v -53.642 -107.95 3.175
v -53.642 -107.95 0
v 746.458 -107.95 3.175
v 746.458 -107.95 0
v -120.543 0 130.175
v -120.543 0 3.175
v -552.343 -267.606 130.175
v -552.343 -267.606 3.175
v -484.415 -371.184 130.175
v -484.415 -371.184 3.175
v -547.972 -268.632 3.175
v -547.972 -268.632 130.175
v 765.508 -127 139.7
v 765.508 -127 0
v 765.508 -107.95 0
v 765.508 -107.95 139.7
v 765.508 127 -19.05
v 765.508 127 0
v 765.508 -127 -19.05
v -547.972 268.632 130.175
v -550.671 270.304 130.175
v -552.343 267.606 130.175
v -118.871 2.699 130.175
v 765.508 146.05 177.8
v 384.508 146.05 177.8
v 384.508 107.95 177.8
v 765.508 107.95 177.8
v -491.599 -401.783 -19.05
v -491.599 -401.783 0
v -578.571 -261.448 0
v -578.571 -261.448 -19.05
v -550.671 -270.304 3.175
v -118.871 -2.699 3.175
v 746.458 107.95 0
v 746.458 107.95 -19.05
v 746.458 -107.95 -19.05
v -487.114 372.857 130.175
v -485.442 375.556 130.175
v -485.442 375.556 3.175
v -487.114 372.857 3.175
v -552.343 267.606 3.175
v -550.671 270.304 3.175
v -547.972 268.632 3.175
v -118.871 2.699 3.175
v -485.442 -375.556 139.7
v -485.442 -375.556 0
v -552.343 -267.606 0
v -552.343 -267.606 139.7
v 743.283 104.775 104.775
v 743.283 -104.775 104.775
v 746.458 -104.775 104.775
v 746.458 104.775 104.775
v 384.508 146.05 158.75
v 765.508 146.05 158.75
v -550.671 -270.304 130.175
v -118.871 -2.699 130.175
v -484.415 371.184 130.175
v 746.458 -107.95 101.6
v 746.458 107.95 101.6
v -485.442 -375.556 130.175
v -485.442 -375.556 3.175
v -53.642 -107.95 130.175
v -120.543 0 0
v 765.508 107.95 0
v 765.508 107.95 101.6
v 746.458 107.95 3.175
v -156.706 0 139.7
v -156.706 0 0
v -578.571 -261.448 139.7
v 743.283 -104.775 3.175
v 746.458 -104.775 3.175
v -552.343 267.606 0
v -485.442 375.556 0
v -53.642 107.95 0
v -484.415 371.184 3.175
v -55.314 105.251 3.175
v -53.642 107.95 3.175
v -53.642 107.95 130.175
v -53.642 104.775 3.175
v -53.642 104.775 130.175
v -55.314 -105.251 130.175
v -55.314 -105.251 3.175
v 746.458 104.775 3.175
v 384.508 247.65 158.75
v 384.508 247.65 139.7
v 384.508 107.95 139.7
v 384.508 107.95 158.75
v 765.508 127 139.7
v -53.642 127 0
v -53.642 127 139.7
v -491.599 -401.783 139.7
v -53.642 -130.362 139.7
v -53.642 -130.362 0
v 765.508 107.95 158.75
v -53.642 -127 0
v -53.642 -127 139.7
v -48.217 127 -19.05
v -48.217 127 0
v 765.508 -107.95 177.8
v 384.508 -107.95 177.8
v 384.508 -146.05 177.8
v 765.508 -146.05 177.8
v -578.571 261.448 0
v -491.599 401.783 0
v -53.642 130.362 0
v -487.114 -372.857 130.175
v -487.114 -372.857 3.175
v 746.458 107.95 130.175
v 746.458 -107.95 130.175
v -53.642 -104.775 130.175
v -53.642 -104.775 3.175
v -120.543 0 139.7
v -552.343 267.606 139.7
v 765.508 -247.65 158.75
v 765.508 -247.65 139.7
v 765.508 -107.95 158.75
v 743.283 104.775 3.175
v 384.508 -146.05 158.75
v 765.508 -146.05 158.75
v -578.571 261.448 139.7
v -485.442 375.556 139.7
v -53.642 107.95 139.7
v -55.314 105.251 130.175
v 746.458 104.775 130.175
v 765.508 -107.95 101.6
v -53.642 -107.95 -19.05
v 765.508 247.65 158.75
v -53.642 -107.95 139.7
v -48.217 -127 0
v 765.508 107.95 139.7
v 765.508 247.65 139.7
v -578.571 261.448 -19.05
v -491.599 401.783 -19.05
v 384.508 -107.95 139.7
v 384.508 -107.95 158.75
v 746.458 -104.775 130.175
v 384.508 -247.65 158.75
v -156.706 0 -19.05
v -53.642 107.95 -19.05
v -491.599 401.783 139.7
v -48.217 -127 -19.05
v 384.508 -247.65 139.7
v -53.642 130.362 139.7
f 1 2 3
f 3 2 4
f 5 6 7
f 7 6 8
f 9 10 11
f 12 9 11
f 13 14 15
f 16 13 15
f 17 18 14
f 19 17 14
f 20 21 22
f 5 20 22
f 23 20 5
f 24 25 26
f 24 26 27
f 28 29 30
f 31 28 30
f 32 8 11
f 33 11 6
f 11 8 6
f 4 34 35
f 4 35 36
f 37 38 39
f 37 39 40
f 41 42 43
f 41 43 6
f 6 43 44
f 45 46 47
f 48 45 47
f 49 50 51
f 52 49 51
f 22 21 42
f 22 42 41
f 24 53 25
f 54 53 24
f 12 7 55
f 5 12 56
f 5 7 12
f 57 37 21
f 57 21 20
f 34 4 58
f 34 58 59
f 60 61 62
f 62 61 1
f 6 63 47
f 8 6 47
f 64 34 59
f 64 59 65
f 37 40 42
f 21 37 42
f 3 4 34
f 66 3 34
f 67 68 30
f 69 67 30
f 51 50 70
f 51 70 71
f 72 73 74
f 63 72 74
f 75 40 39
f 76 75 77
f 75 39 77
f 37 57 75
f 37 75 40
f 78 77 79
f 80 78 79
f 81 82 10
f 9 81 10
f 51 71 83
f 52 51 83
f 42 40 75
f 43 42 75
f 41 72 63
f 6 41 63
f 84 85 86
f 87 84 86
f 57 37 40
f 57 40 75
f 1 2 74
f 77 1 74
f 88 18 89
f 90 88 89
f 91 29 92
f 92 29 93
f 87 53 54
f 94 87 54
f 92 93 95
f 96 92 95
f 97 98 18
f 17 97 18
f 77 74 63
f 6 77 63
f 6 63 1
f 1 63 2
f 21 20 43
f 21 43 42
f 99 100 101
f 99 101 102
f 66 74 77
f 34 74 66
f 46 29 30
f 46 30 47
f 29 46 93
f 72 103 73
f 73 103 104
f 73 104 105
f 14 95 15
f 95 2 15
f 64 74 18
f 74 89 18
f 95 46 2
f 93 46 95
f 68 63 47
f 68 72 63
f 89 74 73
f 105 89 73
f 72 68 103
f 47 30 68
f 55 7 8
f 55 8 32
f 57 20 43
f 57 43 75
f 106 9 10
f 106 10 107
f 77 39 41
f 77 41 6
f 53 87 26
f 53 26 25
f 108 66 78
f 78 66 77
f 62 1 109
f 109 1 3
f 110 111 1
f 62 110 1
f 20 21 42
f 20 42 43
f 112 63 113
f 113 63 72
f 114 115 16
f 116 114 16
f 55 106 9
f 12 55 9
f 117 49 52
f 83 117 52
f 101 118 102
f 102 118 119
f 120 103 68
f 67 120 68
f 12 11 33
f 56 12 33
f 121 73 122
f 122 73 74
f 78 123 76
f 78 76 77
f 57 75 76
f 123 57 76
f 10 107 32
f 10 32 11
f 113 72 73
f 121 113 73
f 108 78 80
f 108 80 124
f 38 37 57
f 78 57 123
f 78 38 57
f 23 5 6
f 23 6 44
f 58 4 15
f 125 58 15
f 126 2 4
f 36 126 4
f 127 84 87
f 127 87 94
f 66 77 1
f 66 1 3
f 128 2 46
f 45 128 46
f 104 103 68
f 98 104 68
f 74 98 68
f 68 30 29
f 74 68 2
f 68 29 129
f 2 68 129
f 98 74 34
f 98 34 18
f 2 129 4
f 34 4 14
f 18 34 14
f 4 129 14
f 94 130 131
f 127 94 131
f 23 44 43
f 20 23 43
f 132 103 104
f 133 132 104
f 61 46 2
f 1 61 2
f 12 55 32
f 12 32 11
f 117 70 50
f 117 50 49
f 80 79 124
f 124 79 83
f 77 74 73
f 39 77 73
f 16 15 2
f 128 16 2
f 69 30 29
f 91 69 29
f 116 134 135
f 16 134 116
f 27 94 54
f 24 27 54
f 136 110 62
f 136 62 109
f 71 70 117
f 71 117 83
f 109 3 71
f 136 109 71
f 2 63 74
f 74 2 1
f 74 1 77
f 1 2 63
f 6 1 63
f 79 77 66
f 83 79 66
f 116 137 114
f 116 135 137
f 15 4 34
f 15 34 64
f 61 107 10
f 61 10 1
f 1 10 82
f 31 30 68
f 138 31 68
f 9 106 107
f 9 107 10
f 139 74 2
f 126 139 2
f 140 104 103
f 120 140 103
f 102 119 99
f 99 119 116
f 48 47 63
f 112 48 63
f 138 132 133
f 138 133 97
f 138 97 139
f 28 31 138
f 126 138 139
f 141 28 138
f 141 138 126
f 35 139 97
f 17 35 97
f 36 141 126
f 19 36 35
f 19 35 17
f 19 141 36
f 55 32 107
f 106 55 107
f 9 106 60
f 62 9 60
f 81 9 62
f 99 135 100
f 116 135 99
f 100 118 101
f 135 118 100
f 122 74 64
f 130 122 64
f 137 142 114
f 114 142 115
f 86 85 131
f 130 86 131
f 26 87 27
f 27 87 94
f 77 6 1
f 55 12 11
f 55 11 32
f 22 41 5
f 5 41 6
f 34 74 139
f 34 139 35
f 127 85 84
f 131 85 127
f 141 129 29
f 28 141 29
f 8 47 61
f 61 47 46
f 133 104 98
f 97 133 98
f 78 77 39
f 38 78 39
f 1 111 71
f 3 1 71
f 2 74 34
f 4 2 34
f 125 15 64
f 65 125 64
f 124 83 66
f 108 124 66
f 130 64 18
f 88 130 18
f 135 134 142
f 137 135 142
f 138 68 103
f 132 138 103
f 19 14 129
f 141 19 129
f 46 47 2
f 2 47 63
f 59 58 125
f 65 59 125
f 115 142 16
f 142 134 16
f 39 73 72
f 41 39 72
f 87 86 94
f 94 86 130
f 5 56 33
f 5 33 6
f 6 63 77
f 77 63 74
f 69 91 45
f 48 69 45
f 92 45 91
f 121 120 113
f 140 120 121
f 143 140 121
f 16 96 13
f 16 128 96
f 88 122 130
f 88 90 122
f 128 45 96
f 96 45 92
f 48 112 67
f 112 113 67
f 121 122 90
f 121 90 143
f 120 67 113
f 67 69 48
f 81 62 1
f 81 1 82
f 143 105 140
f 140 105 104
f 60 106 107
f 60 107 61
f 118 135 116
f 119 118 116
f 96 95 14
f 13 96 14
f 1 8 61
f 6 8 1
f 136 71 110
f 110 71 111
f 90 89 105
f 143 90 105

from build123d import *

# Parameters (mm, degrees)
F1_DEPTH  = 3.175
F2_DEPTH  = 3.175
F3_DEPTH  = 3.175
F0_W      = 800.1
F0_H      = 215.9
F4_DEPTH  = 3.175
F6_DEPTH  = 127
F7_DEPTH  = 127
F8_DEPTH  = 127
F9_DEPTH  = 127
F10_DEPTH = 127
F11_DEPTH = 127
F12_DEPTH = 127
F5_W      = 3.175
F5_H      = 209.55
F13_DEPTH = 101.6
F14_DEPTH = 127
F15_W     = 800.1
F15_H     = 215.9
F16_DEPTH = 19.05
F18_DEPTH = 139.7
F17_W     = 19.05
F17_H     = 215.9
F19_DEPTH = 101.6
F20_W     = 381
F20_H     = 120.65
F20_H_2   = 19.05
F21_DEPTH = 19.05
F22_W     = 381
F22_H     = 38.1
F23_DEPTH = 19.05


with BuildPart() as f1:
    # F0 (on Top) → F1 (new body)
    with BuildSketch(Plane.XY):
        Polygon((-120.5430654606, 0), (-53.64166413, 107.95), (-485.44166413, 375.5556053225), (-552.3430654606, 267.6056053225), align=None)
    extrude(amount=F1_DEPTH)


with BuildPart() as f2:
    # F0 (on Top) → F2 (new body)
    with BuildSketch(Plane.XY):
        Polygon((-485.44166413, -375.5556053225), (-53.64166413, -107.95), (-120.5430654606, 0), (-552.3430654606, -267.6056053225), align=None)
    extrude(amount=F2_DEPTH)


with BuildPart() as f3:
    # F0 (on Top) → F3 (new body)
    with BuildSketch(Plane.XY):
        Polygon((-120.5430654606, 0), (-53.64166413, -107.95), (-53.64166413, 107.95), align=None)
    extrude(amount=F3_DEPTH)


with BuildPart() as f4:
    # F0 (on Top) → F4 (new body)
    with BuildSketch(Plane.XY):
        with Locations((346.40833587, 0)):
            Rectangle(F0_W, F0_H)
    extrude(amount=F4_DEPTH)


with BuildPart() as f6:
    # F5 (on face) → F6 (new body)
    with BuildSketch(Plane.XY.offset(3.175)):
        Polygon((-485.44166413, -375.5556053225), (-53.64166413, -107.95), (-55.3141991632, -105.25125), (-484.4154491632, -371.1843202892), (-487.1141991632, -372.8568553225), align=None)
    extrude(amount=F6_DEPTH)


with BuildPart() as f7:
    # F5 (on face) → F7 (new body)
    with BuildSketch(Plane.XY.offset(3.175)):
        Polygon((-550.6705304273, -270.3043553225), (-487.1141991632, -372.8568553225), (-484.4154491632, -371.1843202892), (-547.9717804273, -268.6318202892), align=None)
    extrude(amount=F7_DEPTH)


with BuildPart() as f8:
    # F5 (on face) → F8 (new body)
    with BuildSketch(Plane.XY.offset(3.175)):
        Polygon((-552.3430654606, -267.6056053225), (-550.6705304273, -270.3043553225), (-547.9717804273, -268.6318202892), (-118.8705304273, -2.69875), (-120.5430654606, 0), align=None)
    extrude(amount=F8_DEPTH)


with BuildPart() as f9:
    # F5 (on face) → F9 (new body)
    with BuildSketch(Plane.XY.offset(3.175)):
        Polygon((-547.9717804273, 268.6318202892), (-550.6705304273, 270.3043553225), (-552.3430654606, 267.6056053225), (-120.5430654606, 0), (-118.8705304273, 2.69875), align=None)
    extrude(amount=F9_DEPTH)


with BuildPart() as f10:
    # F5 (on face) → F10 (new body)
    with BuildSketch(Plane.XY.offset(3.175)):
        Polygon((-55.3141991632, 105.25125), (-53.64166413, 107.95), (-485.44166413, 375.5556053225), (-487.1141991632, 372.8568553225), (-484.4154491632, 371.1843202892), align=None)
    extrude(amount=F10_DEPTH)


with BuildPart() as f11:
    # F5 (on face) → F11 (new body)
    with BuildSketch(Plane.XY.offset(3.175)):
        Polygon((-484.4154491632, 371.1843202892), (-487.1141991632, 372.8568553225), (-550.6705304273, 270.3043553225), (-547.9717804273, 268.6318202892), align=None)
    extrude(amount=F11_DEPTH)


with BuildPart() as f12:
    # F5 (on face) → F12 (new body)
    with BuildSketch(Plane.XY.offset(3.175)):
        Polygon((743.28333587, -104.775), (-53.64166413, -104.775), (-53.64166413, -107.95), (746.45833587, -107.95), (746.45833587, -104.775), align=None)
    extrude(amount=F12_DEPTH)


with BuildPart() as f13:
    # F5 (on face) → F13 (new body)
    with BuildSketch(Plane.XY.offset(3.175)):
        with Locations((744.87083587, 0)):
            Rectangle(F5_W, F5_H)
    extrude(amount=F13_DEPTH)


with BuildPart() as f14:
    # F5 (on face) → F14 (new body)
    with BuildSketch(Plane.XY.offset(3.175)):
        Polygon((-53.64166413, 107.95), (-53.64166413, 104.775), (743.28333587, 104.775), (746.45833587, 104.775), (746.45833587, 107.95), align=None)
    extrude(amount=F14_DEPTH)


with BuildPart() as f16:
    # F15 (on face) → F16 (new body)
    with BuildSketch(Plane(origin=(0, 0, 0), x_dir=(1, 0, 0), z_dir=(0, 0, -1))):
        Polygon((765.50833587, -127), (765.50833587, 127), (-48.2172261842, 127), (-491.5989539304, 401.7833155221), (-578.5707756602, 261.4483155221), (-156.7059850987, 0), (-578.5707756602, -261.4483155221), (-491.5989539304, -401.7833155221), (-48.2172261842, -127), align=None)
        with Locations((346.40833587, 0)):
            Rectangle(F15_W, F15_H, mode=Mode.SUBTRACT)
    extrude(amount=F16_DEPTH)


with BuildPart() as f18:
    # F17 (on face) → F18 (new body)
    with BuildSketch(Plane.XY):
        Polygon((746.45833587, -107.95), (-53.64166413, -107.95), (-53.64166413, -127), (-48.2172261842, -127), (765.50833587, -127), (765.50833587, -107.95), align=None)
        Polygon((-53.64166413, -127), (-53.64166413, -107.95), (-485.44166413, -375.5556053225), (-501.63416413, -385.5908155221), (-491.5989539304, -401.7833155221), (-53.64166413, -130.3617647059), align=None)
        Polygon((-568.5355654606, -277.6408155221), (-552.3430654606, -267.6056053225), (-120.5430654606, 0), (-156.7059850987, 0), (-578.5707756602, -261.4483155221), align=None)
        Polygon((-156.7059850987, 0), (-120.5430654606, 0), (-552.3430654606, 267.6056053225), (-568.5355654606, 277.6408155221), (-578.5707756602, 261.4483155221), align=None)
        Polygon((-485.44166413, 375.5556053225), (-53.64166413, 107.95), (-53.64166413, 127), (-53.64166413, 130.3617647059), (-491.5989539304, 401.7833155221), (-501.63416413, 385.5908155221), align=None)
        Polygon((-53.64166413, 127), (-53.64166413, 107.95), (746.45833587, 107.95), (765.50833587, 107.95), (765.50833587, 127), (-48.2172261842, 127), align=None)
        Polygon((-552.3430654606, 267.6056053225), (-485.44166413, 375.5556053225), (-501.63416413, 385.5908155221), (-568.5355654606, 277.6408155221), align=None)
        Polygon((-501.63416413, -385.5908155221), (-485.44166413, -375.5556053225), (-552.3430654606, -267.6056053225), (-568.5355654606, -277.6408155221), align=None)
    extrude(amount=F18_DEPTH)


with BuildPart() as f19:
    # F17 (on face) → F19 (new body)
    with BuildSketch(Plane.XY):
        with Locations((755.98333587, 0)):
            Rectangle(F17_W, F17_H)
    extrude(amount=F19_DEPTH)


with BuildPart() as f21:
    # F20 (on face) → F21 (new body)
    with BuildSketch(Plane.XY.offset(139.7)):
        with Locations((575.00833587, -187.325)):
            Rectangle(F20_W, F20_H)
        with Locations((575.00833587, -117.475)):
            Rectangle(F20_W, F20_H_2)
    extrude(amount=F21_DEPTH)


with BuildPart() as f21b:
    # F20 (on face) → F21, piece 2 (new body)
    with BuildSketch(Plane.XY.offset(139.7)):
        with Locations((575.00833587, 187.325)):
            Rectangle(F20_W, F20_H)
        with Locations((575.00833587, 117.475)):
            Rectangle(F20_W, F20_H_2)
    extrude(amount=F21_DEPTH)


with BuildPart() as f23:
    # F22 (on face) → F23 (new body)
    with BuildSketch(Plane.XY.offset(158.75)):
        with Locations((575.00833587, -127)):
            Rectangle(F22_W, F22_H)
    extrude(amount=F23_DEPTH)


with BuildPart() as f23b:
    # F22 (on face) → F23, piece 2 (new body)
    with BuildSketch(Plane.XY.offset(158.75)):
        with Locations((575.00833587, 127)):
            Rectangle(F22_W, F22_H)
    extrude(amount=F23_DEPTH)


solid = Compound([f1.part, f2.part, f3.part, f4.part, f6.part, f7.part, f8.part, f9.part, f10.part, f11.part, f12.part, f13.part, f14.part, f16.part, f18.part, f19.part, f21.part, f21b.part, f23.part, f23b.part])
